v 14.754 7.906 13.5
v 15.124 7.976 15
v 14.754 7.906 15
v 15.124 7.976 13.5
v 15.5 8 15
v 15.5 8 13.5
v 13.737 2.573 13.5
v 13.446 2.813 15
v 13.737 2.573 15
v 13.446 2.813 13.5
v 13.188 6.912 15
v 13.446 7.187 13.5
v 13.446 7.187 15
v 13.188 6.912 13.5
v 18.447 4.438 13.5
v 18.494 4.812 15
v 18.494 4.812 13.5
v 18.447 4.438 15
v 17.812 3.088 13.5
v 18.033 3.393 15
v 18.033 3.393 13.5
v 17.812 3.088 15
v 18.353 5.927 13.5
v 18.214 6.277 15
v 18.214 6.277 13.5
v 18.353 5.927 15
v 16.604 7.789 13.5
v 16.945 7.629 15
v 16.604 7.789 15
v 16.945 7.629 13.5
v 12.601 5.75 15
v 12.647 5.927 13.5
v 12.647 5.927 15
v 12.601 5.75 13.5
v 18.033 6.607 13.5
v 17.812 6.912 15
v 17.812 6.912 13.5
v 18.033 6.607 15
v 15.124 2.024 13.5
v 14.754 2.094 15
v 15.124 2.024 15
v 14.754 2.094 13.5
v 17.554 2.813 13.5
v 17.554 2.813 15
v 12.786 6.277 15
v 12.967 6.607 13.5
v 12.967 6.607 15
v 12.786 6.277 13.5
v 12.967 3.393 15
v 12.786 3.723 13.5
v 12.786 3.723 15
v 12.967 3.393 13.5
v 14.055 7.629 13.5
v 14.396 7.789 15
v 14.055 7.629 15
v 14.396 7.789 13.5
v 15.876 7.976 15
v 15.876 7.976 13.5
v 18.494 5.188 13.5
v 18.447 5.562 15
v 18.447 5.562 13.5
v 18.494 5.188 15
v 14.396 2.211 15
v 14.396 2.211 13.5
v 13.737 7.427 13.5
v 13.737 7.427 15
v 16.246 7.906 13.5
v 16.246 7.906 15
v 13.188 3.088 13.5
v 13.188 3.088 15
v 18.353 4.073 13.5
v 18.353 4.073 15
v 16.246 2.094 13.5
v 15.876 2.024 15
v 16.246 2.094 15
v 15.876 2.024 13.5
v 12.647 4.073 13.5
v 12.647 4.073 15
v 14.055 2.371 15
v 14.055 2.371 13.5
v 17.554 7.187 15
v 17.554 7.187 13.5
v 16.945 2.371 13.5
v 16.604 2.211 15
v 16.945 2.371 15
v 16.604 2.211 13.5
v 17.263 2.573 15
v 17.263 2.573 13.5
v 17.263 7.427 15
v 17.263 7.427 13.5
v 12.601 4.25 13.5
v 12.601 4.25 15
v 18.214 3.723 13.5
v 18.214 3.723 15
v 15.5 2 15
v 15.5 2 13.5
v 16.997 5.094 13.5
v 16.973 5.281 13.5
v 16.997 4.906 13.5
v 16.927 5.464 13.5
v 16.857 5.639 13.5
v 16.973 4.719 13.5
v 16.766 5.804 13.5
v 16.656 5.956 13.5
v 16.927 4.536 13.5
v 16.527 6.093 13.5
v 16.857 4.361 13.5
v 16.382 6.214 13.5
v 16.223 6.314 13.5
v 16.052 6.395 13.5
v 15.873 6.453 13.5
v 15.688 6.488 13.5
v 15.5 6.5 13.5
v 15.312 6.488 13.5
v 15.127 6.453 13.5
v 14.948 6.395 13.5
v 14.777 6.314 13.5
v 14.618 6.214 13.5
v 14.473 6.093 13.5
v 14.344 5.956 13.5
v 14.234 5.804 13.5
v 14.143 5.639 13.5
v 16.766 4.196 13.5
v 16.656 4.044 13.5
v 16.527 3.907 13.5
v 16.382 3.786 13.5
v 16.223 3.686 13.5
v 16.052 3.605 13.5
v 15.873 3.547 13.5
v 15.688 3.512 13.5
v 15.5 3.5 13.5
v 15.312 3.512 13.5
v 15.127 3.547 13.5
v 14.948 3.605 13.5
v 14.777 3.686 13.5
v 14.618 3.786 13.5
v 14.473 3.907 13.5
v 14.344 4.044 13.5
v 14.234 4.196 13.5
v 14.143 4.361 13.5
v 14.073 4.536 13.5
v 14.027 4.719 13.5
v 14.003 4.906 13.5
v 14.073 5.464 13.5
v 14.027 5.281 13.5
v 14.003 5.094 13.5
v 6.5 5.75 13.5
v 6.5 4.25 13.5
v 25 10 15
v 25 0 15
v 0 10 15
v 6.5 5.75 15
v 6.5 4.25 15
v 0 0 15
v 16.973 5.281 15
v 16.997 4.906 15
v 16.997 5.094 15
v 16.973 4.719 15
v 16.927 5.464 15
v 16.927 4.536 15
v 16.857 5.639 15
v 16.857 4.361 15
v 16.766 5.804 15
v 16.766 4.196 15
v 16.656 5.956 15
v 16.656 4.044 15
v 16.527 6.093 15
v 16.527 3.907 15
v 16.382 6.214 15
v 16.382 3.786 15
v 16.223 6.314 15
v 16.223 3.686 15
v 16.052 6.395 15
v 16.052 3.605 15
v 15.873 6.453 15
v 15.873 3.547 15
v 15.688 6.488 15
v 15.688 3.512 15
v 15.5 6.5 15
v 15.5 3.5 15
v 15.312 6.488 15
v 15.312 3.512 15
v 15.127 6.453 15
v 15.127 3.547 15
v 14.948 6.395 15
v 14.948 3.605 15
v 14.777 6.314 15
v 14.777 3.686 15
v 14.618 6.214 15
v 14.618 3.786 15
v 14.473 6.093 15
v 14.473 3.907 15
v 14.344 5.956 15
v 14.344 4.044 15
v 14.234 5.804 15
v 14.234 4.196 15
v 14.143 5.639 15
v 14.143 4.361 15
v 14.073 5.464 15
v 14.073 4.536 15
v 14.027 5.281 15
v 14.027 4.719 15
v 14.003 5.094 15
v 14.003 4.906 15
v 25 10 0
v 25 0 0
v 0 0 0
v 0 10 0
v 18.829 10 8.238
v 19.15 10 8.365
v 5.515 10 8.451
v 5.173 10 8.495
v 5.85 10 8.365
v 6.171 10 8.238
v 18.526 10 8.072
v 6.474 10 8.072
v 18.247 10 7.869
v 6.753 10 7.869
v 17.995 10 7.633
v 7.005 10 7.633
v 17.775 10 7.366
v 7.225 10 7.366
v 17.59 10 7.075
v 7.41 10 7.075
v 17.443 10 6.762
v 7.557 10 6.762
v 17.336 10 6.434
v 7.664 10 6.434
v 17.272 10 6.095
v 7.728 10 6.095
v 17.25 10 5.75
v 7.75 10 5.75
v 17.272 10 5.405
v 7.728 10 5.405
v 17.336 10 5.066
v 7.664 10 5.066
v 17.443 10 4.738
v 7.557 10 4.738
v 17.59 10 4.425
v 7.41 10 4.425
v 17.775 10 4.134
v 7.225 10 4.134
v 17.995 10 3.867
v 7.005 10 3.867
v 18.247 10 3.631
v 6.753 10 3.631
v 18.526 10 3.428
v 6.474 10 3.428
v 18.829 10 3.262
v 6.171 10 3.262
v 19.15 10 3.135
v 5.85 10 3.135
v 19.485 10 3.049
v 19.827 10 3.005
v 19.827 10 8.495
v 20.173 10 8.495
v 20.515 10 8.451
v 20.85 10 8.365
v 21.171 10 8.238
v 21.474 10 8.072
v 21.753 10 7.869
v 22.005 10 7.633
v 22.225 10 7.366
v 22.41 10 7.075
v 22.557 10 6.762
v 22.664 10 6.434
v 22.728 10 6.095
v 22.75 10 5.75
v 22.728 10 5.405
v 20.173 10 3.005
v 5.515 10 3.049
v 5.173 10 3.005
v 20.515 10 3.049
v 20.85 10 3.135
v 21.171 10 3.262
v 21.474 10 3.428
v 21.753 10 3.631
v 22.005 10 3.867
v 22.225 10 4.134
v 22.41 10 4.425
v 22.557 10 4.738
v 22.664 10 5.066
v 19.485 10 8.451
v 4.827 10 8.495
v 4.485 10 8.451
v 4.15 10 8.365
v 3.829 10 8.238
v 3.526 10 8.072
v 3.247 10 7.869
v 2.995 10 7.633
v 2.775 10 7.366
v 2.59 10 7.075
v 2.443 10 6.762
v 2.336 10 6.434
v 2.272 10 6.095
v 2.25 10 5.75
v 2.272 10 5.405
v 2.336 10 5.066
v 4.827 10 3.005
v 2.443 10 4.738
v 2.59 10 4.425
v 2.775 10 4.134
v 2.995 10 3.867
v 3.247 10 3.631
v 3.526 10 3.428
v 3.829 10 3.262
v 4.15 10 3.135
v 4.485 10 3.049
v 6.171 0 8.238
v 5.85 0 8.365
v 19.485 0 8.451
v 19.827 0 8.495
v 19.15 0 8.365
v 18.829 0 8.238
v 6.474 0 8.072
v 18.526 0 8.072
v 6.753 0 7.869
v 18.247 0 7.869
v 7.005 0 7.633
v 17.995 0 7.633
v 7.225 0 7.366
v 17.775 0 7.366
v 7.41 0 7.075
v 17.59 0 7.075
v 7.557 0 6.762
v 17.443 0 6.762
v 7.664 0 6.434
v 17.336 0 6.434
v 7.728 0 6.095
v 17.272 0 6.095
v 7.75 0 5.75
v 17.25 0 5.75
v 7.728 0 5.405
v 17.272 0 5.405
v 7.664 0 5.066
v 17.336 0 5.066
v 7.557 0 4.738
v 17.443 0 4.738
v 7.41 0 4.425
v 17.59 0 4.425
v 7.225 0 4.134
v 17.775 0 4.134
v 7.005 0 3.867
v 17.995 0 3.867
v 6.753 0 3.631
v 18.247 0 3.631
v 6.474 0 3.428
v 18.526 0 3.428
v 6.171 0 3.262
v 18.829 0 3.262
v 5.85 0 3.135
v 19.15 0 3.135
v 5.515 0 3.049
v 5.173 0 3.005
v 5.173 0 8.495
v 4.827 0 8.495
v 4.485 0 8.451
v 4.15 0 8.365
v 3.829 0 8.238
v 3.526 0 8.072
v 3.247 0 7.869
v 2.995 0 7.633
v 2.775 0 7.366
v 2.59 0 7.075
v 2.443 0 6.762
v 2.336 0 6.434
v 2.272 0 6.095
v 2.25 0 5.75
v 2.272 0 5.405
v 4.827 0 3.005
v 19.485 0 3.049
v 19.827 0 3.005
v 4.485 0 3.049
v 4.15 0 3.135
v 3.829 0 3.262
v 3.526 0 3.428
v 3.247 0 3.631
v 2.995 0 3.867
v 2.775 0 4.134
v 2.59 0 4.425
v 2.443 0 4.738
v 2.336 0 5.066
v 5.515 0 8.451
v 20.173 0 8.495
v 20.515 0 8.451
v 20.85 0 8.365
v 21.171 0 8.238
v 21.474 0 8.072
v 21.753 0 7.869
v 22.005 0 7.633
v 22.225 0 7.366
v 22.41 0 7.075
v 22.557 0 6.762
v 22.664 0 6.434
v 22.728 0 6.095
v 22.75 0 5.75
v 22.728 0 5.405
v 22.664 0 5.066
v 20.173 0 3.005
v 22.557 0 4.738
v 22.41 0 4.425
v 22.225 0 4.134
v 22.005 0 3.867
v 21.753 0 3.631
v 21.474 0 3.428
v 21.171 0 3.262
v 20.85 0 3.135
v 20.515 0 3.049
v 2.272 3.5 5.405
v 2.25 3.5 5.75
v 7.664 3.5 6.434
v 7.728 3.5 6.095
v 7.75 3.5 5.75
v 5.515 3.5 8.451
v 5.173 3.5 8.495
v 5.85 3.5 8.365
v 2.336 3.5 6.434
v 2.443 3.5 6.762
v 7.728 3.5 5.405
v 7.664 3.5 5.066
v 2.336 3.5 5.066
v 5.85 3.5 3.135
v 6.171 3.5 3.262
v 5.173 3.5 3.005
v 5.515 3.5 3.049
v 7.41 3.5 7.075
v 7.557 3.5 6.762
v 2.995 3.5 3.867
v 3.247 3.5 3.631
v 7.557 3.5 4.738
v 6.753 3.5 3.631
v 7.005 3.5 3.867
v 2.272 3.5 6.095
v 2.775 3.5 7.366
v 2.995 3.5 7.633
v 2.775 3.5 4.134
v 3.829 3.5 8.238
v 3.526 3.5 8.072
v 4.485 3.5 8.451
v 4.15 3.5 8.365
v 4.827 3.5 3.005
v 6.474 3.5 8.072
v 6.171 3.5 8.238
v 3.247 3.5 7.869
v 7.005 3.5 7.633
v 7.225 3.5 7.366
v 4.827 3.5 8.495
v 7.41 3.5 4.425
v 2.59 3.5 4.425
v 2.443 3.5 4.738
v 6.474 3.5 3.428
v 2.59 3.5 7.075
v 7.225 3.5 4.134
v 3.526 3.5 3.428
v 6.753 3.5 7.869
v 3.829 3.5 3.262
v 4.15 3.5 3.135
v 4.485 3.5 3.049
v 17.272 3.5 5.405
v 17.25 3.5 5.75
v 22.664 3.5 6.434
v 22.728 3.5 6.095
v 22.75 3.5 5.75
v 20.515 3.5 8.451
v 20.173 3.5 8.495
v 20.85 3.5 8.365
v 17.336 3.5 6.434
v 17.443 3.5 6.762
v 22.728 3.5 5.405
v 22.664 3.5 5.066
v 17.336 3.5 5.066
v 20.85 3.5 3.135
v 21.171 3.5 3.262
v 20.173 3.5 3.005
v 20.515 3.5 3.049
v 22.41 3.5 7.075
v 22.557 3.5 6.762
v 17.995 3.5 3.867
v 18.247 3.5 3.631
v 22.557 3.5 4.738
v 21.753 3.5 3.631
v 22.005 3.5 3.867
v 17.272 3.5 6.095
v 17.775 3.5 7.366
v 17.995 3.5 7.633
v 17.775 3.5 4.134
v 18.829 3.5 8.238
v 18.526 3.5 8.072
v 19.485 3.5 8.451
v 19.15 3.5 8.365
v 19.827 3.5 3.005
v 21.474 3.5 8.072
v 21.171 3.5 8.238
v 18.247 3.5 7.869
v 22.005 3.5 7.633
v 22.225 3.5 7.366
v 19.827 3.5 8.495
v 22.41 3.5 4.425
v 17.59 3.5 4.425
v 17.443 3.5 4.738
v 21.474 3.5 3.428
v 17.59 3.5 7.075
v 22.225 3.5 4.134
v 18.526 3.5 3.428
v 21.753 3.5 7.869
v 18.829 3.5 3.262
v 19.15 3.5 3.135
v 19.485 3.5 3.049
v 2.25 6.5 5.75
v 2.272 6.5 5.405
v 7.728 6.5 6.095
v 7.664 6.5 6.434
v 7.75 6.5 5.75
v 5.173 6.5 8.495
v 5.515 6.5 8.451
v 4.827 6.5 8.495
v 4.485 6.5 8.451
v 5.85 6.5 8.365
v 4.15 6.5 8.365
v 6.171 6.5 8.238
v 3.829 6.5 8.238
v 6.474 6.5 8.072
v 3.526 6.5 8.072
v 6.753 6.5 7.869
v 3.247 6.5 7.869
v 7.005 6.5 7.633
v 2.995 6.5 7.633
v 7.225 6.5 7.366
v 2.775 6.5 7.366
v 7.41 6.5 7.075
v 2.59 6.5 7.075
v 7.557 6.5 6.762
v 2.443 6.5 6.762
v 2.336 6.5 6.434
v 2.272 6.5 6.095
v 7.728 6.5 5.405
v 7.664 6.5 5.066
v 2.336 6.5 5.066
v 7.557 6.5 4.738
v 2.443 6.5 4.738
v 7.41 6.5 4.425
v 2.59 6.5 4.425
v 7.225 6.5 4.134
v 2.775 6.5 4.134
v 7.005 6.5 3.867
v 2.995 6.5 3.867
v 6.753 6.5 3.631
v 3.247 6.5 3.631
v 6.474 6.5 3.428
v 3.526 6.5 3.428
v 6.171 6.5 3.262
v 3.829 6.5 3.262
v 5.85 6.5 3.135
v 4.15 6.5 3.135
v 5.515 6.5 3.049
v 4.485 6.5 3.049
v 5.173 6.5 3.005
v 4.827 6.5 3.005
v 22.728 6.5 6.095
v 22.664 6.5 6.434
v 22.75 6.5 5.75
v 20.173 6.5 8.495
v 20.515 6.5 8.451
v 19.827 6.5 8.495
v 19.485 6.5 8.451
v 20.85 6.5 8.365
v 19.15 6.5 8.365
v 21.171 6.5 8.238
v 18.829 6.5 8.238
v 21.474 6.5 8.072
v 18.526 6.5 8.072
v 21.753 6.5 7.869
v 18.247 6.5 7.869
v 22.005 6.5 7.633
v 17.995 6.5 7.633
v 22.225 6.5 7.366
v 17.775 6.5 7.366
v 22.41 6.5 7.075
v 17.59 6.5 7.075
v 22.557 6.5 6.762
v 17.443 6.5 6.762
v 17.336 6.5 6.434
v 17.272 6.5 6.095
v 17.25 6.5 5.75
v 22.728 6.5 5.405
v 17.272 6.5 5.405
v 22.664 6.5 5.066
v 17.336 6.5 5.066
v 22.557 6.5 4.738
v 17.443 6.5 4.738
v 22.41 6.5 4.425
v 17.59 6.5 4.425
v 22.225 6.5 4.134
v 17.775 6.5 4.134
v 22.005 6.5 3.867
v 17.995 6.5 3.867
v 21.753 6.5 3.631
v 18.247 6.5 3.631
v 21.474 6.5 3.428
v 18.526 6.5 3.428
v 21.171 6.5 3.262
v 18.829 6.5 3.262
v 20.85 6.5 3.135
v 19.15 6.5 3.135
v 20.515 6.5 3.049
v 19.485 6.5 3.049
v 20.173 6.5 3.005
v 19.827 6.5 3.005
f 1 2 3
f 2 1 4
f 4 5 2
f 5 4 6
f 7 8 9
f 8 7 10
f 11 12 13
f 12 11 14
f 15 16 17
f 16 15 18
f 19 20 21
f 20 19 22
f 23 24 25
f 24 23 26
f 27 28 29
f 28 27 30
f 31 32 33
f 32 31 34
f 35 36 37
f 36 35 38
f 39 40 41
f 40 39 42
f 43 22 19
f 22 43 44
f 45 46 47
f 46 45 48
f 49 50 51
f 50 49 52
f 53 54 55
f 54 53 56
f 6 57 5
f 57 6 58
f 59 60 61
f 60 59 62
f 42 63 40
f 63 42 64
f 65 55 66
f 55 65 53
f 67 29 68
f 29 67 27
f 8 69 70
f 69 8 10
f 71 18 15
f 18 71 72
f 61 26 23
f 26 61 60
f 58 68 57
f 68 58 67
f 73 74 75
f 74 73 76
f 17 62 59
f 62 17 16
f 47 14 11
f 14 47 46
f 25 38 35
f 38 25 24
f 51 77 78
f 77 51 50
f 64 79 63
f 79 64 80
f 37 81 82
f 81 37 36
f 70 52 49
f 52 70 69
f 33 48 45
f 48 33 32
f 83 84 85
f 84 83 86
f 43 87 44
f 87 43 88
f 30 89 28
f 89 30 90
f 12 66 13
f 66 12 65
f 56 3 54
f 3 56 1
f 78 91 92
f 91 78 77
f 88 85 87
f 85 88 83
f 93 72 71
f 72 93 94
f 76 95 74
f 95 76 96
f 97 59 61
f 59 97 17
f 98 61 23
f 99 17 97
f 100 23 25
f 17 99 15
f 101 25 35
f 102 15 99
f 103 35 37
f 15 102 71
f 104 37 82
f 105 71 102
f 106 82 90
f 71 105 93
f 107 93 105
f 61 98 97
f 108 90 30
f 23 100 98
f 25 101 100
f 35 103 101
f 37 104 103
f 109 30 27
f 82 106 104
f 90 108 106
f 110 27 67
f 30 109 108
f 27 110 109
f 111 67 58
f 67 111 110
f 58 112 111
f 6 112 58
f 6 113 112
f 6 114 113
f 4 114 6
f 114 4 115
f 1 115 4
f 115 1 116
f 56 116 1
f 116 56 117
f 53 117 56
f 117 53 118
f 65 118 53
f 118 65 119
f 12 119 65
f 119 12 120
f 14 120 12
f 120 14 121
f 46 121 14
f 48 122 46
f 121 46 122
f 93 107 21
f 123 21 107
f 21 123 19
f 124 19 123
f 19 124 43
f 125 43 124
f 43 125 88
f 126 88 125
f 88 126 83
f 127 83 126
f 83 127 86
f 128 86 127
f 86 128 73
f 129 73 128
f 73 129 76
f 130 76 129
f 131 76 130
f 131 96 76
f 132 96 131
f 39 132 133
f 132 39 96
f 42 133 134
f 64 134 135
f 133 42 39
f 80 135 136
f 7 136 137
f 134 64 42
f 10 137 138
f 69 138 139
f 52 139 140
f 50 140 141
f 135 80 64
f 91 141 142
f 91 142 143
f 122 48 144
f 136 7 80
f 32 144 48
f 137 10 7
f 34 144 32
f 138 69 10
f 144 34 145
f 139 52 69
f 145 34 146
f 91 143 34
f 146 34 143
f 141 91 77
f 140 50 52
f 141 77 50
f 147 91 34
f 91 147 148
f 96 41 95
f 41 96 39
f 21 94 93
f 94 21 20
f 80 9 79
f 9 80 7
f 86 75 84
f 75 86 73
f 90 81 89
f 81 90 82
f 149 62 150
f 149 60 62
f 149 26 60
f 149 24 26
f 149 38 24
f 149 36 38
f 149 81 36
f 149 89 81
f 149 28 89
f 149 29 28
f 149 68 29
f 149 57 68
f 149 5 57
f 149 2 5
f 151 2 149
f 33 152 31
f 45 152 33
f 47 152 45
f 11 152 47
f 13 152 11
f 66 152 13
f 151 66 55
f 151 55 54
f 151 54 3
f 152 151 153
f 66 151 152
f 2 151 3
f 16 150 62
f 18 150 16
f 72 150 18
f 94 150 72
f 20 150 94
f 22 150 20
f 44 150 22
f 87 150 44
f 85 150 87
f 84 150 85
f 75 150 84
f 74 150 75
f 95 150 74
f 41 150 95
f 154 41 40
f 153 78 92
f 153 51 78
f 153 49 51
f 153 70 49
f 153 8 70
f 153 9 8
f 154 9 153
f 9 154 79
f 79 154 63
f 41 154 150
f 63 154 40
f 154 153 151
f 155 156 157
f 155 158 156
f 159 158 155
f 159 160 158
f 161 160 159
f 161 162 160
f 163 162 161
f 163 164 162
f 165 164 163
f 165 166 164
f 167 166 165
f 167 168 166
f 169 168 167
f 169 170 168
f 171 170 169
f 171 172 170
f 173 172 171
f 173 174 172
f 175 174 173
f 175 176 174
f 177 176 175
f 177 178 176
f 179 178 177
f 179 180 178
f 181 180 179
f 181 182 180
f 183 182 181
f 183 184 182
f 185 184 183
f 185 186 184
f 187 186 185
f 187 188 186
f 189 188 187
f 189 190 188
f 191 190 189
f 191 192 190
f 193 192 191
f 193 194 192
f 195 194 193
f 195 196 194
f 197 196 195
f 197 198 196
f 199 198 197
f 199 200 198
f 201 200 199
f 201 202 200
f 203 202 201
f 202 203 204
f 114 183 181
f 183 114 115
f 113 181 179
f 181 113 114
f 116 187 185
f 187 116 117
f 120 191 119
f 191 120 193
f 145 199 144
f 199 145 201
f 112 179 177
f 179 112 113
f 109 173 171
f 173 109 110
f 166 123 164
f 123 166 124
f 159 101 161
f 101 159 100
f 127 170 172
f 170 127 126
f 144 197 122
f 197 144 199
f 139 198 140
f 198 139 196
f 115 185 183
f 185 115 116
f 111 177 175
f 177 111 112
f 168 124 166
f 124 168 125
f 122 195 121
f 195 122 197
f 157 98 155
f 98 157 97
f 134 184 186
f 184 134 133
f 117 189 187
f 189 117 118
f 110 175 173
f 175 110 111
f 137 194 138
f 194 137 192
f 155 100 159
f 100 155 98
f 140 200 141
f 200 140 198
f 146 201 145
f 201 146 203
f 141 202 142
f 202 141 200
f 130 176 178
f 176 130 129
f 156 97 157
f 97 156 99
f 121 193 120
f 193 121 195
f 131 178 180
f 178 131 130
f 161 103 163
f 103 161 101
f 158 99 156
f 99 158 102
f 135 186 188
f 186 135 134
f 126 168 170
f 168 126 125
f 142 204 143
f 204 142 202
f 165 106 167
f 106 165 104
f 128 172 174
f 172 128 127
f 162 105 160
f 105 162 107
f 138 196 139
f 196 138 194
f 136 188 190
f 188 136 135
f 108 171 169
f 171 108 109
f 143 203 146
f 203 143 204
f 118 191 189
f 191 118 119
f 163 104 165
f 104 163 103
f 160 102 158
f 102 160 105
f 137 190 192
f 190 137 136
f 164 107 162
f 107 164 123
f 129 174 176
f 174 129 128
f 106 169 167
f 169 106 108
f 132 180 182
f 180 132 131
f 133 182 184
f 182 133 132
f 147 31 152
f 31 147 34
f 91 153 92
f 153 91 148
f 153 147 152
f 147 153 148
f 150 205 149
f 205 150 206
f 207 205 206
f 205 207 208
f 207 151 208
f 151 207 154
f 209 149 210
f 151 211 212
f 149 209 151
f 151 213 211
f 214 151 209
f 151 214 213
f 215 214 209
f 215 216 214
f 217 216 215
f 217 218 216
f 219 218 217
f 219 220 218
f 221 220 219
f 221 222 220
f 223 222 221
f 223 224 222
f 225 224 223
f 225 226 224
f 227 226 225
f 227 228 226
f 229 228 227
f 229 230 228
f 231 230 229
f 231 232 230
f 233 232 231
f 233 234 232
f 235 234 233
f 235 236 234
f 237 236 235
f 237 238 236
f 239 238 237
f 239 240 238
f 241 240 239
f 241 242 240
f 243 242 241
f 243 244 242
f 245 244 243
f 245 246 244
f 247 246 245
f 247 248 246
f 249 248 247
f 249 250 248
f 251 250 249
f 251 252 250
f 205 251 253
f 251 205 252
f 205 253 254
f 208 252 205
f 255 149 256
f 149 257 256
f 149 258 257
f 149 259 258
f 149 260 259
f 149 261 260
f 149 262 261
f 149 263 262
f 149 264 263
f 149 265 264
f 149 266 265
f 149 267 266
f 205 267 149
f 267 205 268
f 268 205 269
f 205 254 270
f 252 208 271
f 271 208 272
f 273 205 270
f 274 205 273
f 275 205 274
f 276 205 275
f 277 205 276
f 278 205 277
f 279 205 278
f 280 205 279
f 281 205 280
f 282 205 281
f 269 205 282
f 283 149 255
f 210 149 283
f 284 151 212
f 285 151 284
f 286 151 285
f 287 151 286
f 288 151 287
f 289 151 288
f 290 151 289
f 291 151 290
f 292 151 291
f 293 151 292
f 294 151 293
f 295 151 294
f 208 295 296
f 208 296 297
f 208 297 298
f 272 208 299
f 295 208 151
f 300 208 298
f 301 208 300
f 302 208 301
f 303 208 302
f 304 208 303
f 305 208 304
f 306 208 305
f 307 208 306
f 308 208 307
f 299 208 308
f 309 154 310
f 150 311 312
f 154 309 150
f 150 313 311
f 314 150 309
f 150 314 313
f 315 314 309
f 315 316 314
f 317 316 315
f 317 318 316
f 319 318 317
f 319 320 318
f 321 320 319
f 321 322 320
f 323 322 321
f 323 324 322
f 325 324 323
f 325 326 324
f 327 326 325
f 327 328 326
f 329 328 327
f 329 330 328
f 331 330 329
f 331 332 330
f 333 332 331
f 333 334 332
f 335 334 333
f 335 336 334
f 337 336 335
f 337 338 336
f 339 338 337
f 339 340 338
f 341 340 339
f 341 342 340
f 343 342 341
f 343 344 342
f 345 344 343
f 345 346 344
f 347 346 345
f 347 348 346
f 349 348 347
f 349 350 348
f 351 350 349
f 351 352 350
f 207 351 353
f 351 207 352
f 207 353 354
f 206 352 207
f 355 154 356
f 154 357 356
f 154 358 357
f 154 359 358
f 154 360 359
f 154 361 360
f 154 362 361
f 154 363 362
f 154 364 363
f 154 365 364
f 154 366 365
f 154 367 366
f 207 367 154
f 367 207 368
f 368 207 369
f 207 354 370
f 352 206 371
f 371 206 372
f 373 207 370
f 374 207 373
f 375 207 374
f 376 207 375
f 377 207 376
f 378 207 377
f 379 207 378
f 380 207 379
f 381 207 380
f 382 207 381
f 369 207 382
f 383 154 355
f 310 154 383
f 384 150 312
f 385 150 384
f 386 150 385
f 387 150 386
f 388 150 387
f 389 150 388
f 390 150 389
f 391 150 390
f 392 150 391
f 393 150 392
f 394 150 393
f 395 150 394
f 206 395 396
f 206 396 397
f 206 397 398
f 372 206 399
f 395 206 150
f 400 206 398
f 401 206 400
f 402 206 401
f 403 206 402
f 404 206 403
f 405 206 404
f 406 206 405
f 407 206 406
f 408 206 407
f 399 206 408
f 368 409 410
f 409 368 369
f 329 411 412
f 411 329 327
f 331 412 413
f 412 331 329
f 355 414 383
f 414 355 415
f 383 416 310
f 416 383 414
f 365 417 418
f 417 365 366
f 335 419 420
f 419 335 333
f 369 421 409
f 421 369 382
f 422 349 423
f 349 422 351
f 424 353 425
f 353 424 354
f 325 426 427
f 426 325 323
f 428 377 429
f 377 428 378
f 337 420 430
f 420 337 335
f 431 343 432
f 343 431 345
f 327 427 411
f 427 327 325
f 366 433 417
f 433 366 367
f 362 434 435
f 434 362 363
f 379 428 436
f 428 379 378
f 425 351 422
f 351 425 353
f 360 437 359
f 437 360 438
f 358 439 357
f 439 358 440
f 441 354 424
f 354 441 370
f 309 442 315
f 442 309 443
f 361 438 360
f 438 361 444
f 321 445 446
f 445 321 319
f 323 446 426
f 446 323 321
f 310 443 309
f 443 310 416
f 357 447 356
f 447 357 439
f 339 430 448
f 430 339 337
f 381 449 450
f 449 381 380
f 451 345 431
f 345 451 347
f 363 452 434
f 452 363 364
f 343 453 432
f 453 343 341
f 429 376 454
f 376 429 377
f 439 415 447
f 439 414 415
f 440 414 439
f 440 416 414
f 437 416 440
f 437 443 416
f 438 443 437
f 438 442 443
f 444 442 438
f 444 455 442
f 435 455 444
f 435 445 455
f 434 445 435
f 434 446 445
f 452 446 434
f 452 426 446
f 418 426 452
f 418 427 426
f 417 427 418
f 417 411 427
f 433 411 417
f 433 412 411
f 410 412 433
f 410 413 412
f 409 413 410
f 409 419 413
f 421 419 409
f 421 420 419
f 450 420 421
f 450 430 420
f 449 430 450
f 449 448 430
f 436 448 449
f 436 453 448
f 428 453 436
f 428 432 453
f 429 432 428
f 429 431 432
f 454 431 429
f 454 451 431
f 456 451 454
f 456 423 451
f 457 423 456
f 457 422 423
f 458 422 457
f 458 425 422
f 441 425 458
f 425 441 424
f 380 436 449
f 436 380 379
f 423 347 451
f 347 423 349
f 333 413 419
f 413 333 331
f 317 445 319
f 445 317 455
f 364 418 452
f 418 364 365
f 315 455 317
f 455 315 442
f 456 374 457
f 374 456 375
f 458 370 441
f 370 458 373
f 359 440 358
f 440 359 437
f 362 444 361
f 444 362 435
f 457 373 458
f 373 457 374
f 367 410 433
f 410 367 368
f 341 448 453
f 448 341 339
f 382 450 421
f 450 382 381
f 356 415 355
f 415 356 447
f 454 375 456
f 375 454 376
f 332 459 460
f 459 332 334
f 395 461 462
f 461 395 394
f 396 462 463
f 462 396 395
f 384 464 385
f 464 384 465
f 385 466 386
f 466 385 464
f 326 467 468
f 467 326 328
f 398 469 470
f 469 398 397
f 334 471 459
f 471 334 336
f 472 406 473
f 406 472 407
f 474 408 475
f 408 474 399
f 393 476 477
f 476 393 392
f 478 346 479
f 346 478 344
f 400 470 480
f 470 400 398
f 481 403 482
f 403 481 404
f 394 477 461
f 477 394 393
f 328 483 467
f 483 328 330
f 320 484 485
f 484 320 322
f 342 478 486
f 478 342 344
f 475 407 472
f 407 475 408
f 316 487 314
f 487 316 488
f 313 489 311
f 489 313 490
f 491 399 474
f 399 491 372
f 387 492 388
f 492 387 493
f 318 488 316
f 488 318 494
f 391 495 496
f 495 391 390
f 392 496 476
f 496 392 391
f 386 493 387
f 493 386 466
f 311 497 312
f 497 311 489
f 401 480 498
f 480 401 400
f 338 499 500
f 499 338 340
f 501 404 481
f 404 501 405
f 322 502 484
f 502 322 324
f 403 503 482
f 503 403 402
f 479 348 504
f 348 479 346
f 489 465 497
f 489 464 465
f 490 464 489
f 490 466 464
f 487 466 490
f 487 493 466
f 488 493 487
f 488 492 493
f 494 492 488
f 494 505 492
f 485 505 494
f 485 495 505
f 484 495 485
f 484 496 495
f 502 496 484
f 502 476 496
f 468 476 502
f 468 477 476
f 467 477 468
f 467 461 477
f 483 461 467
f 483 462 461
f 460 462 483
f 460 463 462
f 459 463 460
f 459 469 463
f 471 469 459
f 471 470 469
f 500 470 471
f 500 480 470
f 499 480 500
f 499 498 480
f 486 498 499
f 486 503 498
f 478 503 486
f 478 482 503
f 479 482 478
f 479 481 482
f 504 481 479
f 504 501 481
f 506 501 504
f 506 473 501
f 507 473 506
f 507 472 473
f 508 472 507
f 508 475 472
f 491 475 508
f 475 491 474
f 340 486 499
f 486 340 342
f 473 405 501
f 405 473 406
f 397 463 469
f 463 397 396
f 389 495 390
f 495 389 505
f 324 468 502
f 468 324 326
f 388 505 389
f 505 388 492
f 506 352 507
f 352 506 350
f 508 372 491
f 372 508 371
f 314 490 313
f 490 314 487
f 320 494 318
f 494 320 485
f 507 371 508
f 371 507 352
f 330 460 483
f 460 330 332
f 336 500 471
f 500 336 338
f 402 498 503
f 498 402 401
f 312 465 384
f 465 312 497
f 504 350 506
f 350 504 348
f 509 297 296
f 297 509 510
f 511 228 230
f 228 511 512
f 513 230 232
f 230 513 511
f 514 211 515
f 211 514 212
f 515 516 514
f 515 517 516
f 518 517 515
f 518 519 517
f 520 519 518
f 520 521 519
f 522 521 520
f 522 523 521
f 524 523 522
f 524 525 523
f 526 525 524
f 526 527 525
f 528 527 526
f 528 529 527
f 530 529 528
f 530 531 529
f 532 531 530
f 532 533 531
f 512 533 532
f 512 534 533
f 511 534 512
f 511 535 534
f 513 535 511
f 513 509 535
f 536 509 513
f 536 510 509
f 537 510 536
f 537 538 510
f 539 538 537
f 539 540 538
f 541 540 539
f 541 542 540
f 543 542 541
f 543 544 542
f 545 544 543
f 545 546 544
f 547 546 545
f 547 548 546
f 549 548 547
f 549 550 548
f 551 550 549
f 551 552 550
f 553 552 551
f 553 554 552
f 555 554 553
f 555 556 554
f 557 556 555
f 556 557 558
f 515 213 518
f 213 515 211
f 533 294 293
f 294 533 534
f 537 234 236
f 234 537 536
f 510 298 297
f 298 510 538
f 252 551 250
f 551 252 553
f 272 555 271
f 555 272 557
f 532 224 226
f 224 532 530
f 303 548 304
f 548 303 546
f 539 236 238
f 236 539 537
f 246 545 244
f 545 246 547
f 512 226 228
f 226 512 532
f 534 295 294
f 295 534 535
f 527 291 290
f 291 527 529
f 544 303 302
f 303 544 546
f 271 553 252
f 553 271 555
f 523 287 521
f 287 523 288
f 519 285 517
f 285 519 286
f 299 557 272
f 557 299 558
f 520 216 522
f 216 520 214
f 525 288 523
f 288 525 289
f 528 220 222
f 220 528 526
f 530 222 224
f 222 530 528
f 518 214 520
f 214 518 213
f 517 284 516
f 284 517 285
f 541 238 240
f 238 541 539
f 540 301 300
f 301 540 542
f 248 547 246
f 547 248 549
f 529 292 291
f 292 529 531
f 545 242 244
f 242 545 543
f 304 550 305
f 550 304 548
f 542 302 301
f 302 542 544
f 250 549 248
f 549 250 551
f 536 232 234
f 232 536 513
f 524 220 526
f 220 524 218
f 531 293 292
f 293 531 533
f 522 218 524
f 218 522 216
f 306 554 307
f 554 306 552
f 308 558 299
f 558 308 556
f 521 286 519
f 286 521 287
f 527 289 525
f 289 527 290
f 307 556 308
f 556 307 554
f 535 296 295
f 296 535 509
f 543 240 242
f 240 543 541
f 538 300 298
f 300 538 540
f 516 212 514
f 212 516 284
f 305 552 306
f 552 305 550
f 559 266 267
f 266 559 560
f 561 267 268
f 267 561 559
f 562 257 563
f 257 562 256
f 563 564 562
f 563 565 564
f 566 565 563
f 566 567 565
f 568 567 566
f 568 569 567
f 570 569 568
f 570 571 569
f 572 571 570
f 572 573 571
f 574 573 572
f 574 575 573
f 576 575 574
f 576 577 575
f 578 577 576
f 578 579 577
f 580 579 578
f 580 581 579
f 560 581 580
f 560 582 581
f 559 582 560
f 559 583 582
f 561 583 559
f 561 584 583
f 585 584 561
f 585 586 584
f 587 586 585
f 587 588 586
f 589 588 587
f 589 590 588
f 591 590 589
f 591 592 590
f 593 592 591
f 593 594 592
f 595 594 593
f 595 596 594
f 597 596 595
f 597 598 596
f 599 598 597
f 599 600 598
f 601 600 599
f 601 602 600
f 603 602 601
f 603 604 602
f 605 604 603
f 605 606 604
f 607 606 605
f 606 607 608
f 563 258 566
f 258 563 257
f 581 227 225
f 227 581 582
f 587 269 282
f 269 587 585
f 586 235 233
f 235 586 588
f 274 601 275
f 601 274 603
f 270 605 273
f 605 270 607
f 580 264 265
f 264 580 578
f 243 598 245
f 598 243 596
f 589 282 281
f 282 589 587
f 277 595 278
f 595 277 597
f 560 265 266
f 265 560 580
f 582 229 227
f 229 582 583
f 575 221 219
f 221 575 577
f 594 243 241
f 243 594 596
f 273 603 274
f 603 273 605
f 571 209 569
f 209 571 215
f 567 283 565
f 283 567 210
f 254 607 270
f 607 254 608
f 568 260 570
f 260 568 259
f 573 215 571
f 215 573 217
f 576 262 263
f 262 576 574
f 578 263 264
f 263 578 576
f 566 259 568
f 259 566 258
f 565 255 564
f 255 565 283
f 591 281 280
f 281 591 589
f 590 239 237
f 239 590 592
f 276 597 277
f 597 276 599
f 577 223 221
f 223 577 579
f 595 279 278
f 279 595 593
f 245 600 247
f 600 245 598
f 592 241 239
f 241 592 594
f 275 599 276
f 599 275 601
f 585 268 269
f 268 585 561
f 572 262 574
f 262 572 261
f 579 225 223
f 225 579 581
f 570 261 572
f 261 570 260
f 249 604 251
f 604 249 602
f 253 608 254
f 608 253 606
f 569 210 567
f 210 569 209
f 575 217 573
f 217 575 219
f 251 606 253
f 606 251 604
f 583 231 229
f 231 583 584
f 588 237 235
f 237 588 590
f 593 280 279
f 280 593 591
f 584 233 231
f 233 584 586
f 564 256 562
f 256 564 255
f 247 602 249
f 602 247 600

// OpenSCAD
// file: specification_of_components.scad
// Copyright 2020,2024 Martin Scheidt (Attribution 4.0 International, CC-BY 4.0)
//
// You are free to copy and redistribute the material in any medium or format.
// You are free to remix, transform, and build upon the material for any purpose, even commercially.
// You must give appropriate credit, provide a link to the license, and indicate if changes were made.
// You may not apply legal terms or technological measures that legally restrict others from doing anything the license permits.
// No warranties are given.

/*****
To have the dimensions of all components at one place
*******/

/*******
TODO
- standardisation of move tolerance
- standard on which part the move tolerance is substracted?
******/
// ATTENTION: Note the general move_tolerance of 0.5

move_tolerance = 0.5;

/***************wood rail specification***************/
wood_thickness_middle = 11.5;
wood_thickness_rail = 5.5;

straight_length = 144.5;

curve_radius = 182; // inner radius
curve_angle = 45; // degree

/***************magnet specifications***************/
magnet_thickness = 3;
magnet_diameter = 5;
magnet_distance_to_middle = 7.5;
magnet_z = 5.75;

/***************engraving specifications***************/
engraving_height = 1.5;//(block_height-handle_height)/2;
engraving_thickness = 1.5;

/***************switch_blade_optimized***************/

//blade specification
blade_thickness = 2.5;
blade_cover_thicknes = 0.6; //attention: female blade is thinner -> effect on lever_anchor pins?
blade_length = 45;
blade_width  = 19;

//lever anchor specification
lever_hole_size = 2.7;
lever_anchor_posX = blade_width*1/5;
lever_anchor_posY = blade_length*0.8111;

//pin specification
pin_diameter = 5;
pin_female_diameter = pin_diameter+1.5;
pin_height = wood_thickness_rail+2; //2mm move tolerance
y_pos_first_pin = pin_diameter;
y_pos_second_pin = (blade_length*2/3);
overlap = blade_thickness-blade_cover_thicknes; // height of pin_hole, otherwise the pin_hole doesn't stand on the blade -> bug?

/***************overlap_measure***************/
// ATTENTION: Note the general move_tolerance of 0.5

/***************locking_pin***************/
locker_width = 14;
locker_height = 25;
lever_height = 10;
lever_thickness_switch = 4;
rounding = 0.5;

/***************distant-main_signal***************/
block_width=undef;

// body specifications
axis_diameter = 2.5; //maybe use the same material as lever anchor
body_width = 30; // material constraint
body_depth = 50; // minimum, because of the lockpin diameter
body_height = 13.5; // material constraint
wall_thickness_x = (body_width-block_width)/2-move_tolerance;//5;
wall_thickness_y = lever_thickness_switch;
wall_thickness_z = 2;
track_arc_inner_radius = 182;
sagitta = 0.43; //DE: Pfeilhöhe -> 25mm Straighten round edge in the middle
z_pos_axis = 10; // the block_height=13.5 lies a bit heigher, previous: block_height/2+wall_thickness_z

// Locking Part specifications
lock_lever_depth = 9.5;
lock_lever_thickness = 2.5;
lock_lever_height = 10;
foot_width = 2.5;

// color_block specifications
block_width = 20; //material constraint //body_width-2*wall_thickness_x-move_tolerance;
block_depth = (body_depth-2*wall_thickness_y)/2-3*move_tolerance;
block_height = 13.5; // material constraint
//block_height =(body_height-wall_thickness_z)*1.4; //the heigher the value, the more color_block comes out of the body. BUT also: the higher will be the axis hole
overhang = block_height/2-2*move_tolerance; //the circle has to be flattend at one side with move_tolerance
handle_depth = 10+wall_thickness_y;
handle_height = 3;

//Symbol Specifications
signal_symbol_side_space = 4;
signal_symbol_size = block_width-2*signal_symbol_side_space;
signal_triangle_height = (sqrt(3)*signal_symbol_size)/2;

/***************FZS_SZS***************/
zs_with = 25;
zs_depth = 10;
zs_height = 15;

cp_symbol_side_space = 2;
cp_symbol_size = zs_depth-2*cp_symbol_side_space;
// main file
// Copyright 2024 Martin Scheidt (Attribution 4.0 International, CC-BY 4.0)
//
// You are free to copy and redistribute the material in any medium or format.
// You are free to remix, transform, and build upon the material for any purpose, even commercially.
// You must give appropriate credit, provide a link to the license, and indicate if changes were made.
// You may not apply legal terms or technological measures that legally restrict others from doing anything the license permits.
// No warranties are given.

include<./specification_of_components.scad>

$fn = 50;

module magnet_hole(){
    cylinder(h=magnet_thickness+move_tolerance, d=magnet_diameter+move_tolerance);
}
module route_clearing_point(){
    rotate([0,0,90]) translate([0,-cp_symbol_size/2,-engraving_height]) union(){
        difference(){
            cylinder(h=engraving_height, d=cp_symbol_size);
            cylinder(h=engraving_height, d=cp_symbol_size-2*engraving_thickness);
        }   
        translate([-engraving_thickness/2, cp_symbol_size/2-1,0]) cube([engraving_thickness,cp_symbol_size+1,engraving_height]);
    }
}

module block_clearing_point(){
    rotate([0,0,90]) translate([0,-cp_symbol_size/2,-engraving_height/2]) union(){    
        difference(){
            cube([cp_symbol_size,cp_symbol_size,engraving_height], center=true);
            cube([cp_symbol_size-2*engraving_thickness,cp_symbol_size-2*engraving_thickness,engraving_height], center=true);
        }
        translate([-engraving_thickness/2, cp_symbol_size/2,-engraving_height/2]) cube([engraving_thickness,cp_symbol_size,engraving_height]);
    }
}



module clearing_point(type){
    difference(){
        cube([zs_with,zs_depth,zs_height]);
        //Magnet holes
        translate([zs_with/2-magnet_distance_to_middle,magnet_thickness+move_tolerance,magnet_z]) rotate([90,0,0]) magnet_hole();
        translate([zs_with/2+magnet_distance_to_middle,magnet_thickness+move_tolerance,magnet_z]) rotate([90,0,0]) magnet_hole();
        translate([zs_with/2-magnet_distance_to_middle,zs_depth,magnet_z]) rotate([90,0,0]) magnet_hole();
        translate([zs_with/2+magnet_distance_to_middle,zs_depth,magnet_z]) rotate([90,0,0]) magnet_hole();
        //symbols
        if(type == "rcp"){
            translate([zs_with/2,zs_depth/2,zs_height]) route_clearing_point();
        }
        if(type == "bcp"){
            translate([zs_with/2,zs_depth/2,zs_height]) block_clearing_point();
        }
    }
}

clearing_point("rcp");
//route_clearing_point();
//block_clearing_point();
